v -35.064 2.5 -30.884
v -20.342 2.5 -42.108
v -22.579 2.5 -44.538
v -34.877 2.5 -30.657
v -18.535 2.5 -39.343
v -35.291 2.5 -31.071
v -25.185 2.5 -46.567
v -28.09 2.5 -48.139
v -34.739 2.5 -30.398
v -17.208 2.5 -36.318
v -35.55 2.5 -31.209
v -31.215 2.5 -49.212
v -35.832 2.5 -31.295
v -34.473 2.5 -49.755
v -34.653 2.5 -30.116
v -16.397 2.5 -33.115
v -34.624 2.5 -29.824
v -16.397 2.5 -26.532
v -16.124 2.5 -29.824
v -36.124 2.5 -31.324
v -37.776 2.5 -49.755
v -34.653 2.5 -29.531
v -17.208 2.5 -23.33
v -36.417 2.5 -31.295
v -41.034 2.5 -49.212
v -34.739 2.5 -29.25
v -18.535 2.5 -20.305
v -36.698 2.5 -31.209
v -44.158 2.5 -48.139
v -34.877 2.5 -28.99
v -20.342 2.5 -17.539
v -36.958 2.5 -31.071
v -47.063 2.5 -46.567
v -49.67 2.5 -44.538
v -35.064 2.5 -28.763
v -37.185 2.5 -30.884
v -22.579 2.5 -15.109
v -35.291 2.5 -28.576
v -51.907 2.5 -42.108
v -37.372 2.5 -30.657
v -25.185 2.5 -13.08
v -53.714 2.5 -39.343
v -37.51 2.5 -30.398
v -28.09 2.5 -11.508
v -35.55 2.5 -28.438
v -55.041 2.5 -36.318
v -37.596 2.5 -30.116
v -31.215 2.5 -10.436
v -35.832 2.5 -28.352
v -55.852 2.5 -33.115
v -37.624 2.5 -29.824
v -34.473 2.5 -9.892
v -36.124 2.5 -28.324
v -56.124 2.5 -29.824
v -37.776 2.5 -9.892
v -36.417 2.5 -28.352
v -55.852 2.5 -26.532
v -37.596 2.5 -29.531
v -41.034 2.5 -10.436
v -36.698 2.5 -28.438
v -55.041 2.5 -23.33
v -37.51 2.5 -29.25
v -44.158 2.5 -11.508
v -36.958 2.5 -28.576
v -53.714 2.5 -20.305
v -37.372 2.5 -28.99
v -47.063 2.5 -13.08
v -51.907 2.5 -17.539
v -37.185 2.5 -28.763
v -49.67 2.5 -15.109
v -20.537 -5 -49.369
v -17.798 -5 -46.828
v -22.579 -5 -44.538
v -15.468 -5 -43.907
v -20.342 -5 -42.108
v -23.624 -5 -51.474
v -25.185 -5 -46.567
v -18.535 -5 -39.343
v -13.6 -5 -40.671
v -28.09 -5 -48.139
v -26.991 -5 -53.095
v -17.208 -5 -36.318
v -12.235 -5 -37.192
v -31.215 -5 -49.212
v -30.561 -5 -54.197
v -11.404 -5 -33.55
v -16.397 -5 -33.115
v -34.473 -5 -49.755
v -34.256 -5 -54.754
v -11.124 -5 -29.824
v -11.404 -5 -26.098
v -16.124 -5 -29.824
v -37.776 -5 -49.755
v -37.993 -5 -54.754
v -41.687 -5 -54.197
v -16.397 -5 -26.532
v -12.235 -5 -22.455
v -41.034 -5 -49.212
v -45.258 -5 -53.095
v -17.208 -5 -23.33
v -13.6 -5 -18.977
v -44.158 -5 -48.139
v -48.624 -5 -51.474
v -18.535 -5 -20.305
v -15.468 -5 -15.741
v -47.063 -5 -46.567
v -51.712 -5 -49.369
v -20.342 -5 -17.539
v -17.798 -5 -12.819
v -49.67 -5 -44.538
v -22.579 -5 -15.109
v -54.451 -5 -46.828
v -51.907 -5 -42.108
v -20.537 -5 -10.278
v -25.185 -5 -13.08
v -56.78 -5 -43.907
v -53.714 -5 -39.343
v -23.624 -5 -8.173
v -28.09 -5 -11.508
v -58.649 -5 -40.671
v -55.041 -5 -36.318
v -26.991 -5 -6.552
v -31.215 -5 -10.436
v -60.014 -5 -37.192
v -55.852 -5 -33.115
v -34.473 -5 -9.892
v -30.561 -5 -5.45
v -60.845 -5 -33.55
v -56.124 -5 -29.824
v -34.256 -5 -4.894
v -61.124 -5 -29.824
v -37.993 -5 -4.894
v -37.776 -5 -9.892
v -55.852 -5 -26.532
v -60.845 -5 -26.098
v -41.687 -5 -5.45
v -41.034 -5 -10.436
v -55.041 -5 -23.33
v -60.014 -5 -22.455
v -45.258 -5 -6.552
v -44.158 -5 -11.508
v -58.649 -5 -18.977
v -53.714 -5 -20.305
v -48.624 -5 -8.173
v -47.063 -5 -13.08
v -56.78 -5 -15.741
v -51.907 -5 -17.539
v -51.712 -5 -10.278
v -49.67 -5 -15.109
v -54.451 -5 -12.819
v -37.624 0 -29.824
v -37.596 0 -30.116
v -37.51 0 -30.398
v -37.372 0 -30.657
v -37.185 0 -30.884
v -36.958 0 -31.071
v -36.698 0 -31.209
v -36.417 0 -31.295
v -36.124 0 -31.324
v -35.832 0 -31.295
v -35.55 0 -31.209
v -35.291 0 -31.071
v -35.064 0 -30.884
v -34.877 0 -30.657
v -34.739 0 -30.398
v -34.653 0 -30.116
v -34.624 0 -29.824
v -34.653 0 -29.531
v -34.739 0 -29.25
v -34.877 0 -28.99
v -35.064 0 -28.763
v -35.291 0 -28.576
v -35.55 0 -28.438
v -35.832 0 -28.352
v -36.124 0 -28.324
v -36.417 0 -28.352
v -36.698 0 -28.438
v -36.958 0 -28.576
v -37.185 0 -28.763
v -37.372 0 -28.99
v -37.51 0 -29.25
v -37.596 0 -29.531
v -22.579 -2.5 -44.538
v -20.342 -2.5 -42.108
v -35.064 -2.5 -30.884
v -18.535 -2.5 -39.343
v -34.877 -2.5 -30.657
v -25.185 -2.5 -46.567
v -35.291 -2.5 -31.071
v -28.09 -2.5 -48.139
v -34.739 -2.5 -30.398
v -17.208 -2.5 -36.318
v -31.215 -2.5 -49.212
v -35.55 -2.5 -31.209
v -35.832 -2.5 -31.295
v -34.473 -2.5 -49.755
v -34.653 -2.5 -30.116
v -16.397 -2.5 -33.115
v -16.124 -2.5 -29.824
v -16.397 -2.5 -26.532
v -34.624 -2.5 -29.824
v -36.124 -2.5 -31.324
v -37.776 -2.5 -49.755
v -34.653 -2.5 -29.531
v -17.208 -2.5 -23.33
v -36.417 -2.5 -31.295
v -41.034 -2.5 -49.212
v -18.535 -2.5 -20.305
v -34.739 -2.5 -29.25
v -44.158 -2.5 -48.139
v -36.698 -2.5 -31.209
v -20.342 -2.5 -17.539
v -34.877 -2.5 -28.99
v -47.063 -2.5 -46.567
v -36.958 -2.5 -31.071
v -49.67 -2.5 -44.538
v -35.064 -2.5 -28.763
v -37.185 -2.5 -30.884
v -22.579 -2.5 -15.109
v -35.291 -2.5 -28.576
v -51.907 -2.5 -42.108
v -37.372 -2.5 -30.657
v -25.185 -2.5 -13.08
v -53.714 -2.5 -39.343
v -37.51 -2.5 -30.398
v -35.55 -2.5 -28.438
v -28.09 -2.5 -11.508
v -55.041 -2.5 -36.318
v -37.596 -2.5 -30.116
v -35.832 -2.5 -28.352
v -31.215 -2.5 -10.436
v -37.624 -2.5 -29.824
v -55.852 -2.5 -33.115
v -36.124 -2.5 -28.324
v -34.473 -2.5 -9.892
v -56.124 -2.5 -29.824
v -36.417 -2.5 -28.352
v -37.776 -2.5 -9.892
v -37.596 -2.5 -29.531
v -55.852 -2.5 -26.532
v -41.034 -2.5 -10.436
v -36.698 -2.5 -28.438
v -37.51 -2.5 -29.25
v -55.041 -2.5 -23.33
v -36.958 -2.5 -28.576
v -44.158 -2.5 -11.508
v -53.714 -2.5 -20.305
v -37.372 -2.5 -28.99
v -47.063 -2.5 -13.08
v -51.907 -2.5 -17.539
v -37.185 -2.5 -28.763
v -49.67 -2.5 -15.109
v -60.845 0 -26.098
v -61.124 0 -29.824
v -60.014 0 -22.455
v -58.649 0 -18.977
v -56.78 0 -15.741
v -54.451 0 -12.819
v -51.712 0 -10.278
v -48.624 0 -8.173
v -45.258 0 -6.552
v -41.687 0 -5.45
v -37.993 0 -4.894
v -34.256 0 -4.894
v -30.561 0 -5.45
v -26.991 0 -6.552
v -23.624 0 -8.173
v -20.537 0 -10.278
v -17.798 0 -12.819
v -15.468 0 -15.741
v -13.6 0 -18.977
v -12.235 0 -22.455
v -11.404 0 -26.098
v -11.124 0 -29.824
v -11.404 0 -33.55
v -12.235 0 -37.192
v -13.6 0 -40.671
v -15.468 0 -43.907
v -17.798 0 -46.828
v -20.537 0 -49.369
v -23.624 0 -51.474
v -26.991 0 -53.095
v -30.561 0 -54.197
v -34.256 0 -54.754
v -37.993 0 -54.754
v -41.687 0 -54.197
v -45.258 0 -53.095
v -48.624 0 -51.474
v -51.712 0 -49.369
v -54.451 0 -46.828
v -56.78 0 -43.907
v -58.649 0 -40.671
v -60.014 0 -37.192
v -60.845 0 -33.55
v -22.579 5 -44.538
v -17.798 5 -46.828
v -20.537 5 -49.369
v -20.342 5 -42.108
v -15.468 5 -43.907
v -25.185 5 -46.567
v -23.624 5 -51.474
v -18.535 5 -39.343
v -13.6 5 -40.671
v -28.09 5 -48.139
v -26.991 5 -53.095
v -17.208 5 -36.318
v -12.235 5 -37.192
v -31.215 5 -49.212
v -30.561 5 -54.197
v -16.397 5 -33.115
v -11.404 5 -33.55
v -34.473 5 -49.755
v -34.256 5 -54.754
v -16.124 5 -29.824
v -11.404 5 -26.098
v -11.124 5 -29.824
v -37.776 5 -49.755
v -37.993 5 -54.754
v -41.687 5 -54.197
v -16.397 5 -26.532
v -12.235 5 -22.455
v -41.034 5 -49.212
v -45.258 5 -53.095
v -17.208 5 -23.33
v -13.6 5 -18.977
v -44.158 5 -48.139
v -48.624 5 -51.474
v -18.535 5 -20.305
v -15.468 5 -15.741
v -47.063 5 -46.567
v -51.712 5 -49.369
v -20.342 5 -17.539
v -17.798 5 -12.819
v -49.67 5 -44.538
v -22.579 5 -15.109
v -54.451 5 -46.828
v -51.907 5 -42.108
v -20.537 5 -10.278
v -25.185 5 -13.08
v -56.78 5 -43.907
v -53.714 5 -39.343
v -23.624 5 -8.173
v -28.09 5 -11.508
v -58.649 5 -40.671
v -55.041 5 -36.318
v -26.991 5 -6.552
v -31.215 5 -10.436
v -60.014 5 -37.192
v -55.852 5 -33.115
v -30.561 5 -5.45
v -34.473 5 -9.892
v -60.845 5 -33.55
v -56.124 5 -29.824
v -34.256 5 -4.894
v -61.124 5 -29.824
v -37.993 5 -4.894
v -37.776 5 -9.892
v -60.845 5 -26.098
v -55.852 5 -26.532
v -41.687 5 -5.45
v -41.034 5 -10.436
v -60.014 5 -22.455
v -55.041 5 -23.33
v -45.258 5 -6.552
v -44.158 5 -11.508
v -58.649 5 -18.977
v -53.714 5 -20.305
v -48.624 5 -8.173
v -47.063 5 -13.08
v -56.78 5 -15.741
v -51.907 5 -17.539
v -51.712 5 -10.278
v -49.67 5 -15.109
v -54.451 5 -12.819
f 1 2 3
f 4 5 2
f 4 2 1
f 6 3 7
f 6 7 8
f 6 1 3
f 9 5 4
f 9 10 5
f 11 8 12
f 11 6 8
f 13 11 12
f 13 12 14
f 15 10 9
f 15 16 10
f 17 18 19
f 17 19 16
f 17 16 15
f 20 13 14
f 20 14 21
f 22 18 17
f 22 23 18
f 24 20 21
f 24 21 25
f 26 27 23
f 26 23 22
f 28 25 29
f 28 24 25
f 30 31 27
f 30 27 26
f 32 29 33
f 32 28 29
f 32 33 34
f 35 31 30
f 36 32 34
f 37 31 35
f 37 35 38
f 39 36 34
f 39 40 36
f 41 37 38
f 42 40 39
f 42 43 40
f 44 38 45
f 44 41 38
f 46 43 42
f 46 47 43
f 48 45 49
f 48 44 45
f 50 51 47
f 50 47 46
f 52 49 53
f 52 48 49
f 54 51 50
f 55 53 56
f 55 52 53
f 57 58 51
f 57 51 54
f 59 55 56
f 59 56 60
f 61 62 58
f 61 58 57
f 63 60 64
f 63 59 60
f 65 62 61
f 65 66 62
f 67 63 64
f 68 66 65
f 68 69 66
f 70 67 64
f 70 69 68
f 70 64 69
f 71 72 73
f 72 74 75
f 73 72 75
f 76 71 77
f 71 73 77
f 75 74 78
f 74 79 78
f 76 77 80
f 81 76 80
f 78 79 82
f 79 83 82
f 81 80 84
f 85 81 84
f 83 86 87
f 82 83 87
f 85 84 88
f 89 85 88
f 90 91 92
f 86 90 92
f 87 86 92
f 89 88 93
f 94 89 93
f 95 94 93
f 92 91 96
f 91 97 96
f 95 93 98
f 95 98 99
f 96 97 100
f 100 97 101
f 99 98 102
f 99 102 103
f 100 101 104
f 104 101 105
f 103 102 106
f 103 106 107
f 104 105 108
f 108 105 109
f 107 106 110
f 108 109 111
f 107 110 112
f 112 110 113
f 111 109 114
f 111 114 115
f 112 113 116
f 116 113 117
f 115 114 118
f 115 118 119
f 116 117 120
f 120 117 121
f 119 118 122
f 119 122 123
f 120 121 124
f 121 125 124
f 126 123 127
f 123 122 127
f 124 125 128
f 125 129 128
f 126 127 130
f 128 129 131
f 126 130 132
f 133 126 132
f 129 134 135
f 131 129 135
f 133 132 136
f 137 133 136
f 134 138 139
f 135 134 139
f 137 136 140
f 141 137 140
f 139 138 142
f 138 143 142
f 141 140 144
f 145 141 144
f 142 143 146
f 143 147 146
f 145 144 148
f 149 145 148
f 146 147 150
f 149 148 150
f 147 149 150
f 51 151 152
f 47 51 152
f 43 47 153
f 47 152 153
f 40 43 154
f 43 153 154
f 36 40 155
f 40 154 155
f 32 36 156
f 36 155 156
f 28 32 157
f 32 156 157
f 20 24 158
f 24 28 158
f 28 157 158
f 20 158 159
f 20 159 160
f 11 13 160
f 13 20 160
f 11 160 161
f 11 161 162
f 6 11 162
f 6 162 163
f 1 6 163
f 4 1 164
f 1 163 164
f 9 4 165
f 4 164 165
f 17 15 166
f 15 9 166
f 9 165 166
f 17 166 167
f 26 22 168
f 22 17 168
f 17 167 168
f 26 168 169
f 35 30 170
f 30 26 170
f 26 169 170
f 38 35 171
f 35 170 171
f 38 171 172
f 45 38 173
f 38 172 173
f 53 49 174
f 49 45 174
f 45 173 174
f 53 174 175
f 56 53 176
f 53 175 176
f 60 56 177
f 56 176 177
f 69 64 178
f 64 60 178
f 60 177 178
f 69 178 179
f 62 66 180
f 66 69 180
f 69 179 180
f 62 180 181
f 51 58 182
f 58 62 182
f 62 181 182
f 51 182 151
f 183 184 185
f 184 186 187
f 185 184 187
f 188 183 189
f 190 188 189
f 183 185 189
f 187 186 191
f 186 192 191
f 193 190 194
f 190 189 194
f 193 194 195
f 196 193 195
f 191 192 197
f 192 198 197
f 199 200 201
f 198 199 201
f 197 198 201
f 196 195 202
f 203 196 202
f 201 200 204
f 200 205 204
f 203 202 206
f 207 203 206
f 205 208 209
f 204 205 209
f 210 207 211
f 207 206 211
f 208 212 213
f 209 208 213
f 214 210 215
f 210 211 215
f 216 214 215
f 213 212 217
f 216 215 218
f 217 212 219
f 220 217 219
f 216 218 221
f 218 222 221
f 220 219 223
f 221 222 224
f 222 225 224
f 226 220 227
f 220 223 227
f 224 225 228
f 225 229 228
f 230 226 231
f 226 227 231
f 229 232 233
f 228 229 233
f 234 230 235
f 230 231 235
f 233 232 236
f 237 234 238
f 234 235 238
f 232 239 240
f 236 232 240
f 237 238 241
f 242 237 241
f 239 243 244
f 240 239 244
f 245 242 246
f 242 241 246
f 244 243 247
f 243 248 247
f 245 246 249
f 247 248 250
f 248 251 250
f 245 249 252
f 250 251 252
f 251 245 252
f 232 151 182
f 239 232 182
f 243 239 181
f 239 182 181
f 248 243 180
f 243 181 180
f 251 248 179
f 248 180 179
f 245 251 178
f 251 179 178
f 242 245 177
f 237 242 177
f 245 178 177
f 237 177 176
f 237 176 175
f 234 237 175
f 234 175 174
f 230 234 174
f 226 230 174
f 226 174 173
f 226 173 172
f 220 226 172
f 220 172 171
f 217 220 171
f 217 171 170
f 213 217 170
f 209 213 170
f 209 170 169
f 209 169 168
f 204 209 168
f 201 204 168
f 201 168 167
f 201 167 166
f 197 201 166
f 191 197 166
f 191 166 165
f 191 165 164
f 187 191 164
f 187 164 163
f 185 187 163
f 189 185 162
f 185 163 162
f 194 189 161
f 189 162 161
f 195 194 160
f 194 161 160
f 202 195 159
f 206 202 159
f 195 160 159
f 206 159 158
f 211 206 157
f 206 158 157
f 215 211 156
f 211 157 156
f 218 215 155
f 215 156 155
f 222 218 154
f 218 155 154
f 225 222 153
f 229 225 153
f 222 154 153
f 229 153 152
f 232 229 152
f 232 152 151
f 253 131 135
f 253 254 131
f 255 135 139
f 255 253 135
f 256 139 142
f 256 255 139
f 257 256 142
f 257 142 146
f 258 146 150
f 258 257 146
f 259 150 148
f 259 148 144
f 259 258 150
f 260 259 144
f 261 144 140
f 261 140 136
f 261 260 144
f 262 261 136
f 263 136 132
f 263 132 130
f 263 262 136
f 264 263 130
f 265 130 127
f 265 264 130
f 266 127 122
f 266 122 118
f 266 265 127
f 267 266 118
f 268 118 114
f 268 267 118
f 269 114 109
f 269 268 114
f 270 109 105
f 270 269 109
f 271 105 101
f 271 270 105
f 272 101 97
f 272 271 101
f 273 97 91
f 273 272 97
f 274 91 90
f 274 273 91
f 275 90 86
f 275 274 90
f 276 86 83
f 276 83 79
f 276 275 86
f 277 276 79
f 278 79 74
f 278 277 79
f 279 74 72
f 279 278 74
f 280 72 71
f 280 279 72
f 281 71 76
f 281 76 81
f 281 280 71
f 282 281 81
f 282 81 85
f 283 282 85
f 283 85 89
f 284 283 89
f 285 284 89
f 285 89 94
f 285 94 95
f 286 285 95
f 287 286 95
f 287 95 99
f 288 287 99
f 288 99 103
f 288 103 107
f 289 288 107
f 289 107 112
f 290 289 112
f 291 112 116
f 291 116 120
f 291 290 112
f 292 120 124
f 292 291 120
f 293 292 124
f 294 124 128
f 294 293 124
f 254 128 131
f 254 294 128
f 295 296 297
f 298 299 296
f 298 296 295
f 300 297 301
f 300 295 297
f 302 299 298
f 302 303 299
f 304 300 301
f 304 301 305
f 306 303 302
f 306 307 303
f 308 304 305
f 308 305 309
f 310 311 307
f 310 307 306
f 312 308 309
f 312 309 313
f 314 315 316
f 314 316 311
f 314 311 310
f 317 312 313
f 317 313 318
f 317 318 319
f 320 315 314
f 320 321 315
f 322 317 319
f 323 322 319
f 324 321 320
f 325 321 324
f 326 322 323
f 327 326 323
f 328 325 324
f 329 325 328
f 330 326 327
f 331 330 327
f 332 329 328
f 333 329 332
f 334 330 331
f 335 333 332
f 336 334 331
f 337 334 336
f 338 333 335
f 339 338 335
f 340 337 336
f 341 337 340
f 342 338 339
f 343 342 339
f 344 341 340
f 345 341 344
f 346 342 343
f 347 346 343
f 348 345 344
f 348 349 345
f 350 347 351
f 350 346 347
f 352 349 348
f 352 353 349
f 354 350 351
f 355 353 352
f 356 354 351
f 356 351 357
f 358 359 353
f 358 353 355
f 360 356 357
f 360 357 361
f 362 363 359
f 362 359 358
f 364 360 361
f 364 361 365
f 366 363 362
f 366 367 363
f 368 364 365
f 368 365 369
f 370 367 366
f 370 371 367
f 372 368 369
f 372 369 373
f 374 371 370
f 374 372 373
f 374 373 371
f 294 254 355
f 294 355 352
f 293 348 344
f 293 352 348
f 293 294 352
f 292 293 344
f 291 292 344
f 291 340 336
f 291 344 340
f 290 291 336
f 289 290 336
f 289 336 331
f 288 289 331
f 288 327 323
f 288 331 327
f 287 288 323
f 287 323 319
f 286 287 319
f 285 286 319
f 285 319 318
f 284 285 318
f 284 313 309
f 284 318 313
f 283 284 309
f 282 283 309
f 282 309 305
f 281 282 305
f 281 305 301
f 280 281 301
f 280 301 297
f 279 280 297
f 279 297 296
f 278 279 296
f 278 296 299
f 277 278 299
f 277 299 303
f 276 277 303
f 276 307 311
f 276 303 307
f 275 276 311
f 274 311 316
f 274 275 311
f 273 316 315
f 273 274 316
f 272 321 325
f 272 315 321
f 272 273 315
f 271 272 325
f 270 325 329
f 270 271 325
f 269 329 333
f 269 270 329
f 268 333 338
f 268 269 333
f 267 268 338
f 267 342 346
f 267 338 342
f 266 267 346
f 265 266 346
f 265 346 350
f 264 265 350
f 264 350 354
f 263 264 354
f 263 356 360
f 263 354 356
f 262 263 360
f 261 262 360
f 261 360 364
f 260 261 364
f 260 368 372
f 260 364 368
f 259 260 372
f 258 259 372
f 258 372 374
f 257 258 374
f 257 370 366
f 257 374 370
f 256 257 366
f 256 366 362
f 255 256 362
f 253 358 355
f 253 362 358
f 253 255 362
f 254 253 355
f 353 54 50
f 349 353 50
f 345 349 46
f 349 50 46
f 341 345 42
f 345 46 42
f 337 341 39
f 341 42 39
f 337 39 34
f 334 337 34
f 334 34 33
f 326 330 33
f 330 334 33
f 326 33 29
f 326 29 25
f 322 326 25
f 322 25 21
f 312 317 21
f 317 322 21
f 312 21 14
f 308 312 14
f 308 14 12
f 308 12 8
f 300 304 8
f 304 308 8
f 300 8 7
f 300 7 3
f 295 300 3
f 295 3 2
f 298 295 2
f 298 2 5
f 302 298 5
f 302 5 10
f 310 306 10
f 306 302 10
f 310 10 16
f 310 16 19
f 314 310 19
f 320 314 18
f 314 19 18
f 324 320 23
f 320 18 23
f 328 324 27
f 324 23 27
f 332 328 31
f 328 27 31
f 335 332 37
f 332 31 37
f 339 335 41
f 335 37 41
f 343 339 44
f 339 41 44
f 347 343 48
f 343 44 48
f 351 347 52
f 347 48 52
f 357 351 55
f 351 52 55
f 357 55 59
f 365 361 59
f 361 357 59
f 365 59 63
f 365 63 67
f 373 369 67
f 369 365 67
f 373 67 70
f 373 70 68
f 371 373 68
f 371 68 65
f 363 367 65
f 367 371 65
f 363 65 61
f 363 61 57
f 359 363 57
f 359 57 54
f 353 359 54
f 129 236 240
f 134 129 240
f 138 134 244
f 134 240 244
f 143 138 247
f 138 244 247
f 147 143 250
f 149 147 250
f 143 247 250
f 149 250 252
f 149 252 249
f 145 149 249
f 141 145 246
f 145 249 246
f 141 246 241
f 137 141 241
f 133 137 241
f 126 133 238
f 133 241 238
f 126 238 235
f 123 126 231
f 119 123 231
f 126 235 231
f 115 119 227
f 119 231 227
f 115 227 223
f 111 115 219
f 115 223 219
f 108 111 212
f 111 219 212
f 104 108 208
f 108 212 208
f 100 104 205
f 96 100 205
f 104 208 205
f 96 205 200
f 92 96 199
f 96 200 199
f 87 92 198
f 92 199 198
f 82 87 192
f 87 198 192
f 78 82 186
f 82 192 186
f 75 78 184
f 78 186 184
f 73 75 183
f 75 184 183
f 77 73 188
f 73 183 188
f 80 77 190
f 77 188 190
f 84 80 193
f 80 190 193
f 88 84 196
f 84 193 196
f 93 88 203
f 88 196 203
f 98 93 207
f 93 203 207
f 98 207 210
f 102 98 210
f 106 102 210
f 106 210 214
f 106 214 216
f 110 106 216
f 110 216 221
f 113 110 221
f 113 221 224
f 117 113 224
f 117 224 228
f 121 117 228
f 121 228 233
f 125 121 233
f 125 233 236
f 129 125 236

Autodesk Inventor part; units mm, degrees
ref_plane "YZ Plane" through (0, 0, 0) normal (1, 0, 0) x (0, 1, 0)
ref_plane "XZ Plane" through (0, 0, 0) normal (0, 1, 0) x (-1, 0, 0)
ref_plane "XY Plane" through (0, 0, 0) normal (0, 0, 1) x (1, 0, 0)
sketch "Skizze1" plane through (0, 0, 0) normal (0, 1, 0) x (-1, 0, 0)
  circle A0 centre (36.1244, -29.8236) radius 25
  circle A1 centre (36.1244, -29.8236) radius 1.5
  circle A2 centre (36.1244, -29.8236) radius 20
  point P0 (0, 0)
  dimension "d0" = 50
  dimension "d1" = 40
  dimension "d2" = 3
extrude "Extrusion1" add sketch "Skizze1" along normal blind 5 and the other way blind 5 contours A0
extrude "Extrusion2" add sketch "Skizze1" along normal blind 2.5 and the other way blind 2.5 contours A2
properties part number "Rad"
